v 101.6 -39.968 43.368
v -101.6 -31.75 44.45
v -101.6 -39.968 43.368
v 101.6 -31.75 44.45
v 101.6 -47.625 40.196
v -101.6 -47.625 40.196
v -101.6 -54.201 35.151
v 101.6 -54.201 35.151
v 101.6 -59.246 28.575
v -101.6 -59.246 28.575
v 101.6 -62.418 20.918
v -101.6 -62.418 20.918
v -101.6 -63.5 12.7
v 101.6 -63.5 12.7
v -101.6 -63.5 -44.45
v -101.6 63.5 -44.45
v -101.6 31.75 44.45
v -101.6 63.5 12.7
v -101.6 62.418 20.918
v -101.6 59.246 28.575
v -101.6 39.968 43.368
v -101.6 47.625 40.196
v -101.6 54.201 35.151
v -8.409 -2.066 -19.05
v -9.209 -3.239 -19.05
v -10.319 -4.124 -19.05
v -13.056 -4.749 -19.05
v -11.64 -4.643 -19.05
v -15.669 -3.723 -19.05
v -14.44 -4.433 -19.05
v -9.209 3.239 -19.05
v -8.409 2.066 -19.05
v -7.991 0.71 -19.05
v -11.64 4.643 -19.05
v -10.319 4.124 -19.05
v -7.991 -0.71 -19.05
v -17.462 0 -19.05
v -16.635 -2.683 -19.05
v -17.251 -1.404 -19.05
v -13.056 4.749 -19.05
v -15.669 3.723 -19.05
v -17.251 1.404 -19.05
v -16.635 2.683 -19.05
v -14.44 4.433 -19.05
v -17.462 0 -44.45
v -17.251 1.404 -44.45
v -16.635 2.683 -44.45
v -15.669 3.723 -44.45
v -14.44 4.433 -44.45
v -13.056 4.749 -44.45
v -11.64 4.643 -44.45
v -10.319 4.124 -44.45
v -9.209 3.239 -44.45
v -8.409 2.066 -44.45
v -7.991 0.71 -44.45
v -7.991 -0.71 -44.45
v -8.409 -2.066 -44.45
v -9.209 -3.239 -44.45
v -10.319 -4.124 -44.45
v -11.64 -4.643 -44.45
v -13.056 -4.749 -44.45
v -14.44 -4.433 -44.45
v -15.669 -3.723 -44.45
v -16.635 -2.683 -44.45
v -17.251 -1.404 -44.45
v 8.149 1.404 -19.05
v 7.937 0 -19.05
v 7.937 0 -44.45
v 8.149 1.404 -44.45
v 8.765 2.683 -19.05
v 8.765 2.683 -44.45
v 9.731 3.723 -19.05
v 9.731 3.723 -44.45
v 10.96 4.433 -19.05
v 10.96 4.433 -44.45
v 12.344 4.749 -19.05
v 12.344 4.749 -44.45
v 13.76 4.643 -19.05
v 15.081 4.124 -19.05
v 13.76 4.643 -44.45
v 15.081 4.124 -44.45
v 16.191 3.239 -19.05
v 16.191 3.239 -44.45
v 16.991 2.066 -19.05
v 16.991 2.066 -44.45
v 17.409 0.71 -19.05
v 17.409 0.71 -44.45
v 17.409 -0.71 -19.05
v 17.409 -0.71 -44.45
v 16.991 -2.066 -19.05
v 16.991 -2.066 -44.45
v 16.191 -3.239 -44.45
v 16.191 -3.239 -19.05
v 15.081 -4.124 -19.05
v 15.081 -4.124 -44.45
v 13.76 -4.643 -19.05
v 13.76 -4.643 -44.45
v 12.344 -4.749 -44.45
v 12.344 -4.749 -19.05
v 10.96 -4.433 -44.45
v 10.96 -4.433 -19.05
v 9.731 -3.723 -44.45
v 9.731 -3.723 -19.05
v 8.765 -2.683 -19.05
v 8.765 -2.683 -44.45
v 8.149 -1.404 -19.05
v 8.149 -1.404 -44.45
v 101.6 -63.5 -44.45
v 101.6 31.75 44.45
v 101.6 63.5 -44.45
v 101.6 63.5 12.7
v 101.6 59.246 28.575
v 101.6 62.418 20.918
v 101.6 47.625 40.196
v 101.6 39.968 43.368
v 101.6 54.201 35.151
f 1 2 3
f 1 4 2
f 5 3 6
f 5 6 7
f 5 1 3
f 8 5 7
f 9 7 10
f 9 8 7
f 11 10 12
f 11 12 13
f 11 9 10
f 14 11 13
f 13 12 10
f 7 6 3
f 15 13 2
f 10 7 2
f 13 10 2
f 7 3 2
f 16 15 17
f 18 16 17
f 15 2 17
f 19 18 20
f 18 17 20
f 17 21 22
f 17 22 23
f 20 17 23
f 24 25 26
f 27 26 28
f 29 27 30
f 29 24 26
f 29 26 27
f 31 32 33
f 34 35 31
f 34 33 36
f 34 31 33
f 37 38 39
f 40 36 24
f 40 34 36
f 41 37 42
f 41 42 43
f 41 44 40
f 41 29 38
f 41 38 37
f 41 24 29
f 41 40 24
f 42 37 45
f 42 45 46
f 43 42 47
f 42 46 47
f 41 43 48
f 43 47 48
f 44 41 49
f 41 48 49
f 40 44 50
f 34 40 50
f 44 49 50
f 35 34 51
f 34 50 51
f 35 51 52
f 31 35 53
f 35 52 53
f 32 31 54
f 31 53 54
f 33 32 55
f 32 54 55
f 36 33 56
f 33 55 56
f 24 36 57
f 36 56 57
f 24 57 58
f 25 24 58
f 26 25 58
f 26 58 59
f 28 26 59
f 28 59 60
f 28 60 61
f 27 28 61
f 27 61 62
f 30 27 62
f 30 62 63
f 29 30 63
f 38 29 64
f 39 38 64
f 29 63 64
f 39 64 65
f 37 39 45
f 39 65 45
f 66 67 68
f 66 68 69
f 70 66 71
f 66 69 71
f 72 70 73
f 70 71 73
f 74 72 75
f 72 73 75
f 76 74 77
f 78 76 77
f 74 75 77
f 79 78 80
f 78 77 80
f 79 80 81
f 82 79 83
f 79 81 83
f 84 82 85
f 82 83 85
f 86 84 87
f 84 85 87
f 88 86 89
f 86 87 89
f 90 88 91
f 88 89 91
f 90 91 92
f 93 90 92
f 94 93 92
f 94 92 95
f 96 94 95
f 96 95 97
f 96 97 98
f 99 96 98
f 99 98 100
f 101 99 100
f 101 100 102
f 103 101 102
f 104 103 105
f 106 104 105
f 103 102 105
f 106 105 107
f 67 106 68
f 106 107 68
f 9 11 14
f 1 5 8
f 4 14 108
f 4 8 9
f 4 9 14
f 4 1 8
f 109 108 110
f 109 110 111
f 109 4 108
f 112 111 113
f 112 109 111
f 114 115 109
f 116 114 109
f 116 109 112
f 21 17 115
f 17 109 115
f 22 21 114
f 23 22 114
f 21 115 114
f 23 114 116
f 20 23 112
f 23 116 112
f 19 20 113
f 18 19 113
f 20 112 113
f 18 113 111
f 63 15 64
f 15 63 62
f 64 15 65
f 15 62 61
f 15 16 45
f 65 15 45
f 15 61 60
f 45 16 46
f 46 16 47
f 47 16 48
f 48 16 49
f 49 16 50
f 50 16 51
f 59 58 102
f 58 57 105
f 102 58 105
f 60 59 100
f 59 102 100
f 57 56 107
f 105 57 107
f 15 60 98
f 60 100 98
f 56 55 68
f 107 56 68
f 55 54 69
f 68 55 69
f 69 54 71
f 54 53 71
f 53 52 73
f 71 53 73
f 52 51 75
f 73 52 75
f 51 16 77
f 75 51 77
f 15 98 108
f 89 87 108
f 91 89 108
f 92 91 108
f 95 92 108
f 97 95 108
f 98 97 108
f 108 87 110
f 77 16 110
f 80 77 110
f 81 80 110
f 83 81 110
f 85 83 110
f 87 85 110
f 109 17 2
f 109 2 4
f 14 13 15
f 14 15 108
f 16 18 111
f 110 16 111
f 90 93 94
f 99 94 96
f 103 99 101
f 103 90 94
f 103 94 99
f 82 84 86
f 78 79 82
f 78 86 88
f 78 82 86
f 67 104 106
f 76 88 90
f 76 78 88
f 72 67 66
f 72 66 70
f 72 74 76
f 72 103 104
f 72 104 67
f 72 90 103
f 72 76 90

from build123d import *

# Parameters (mm, degrees)
SKETCH1_W           = 203.2
SKETCH1_H           = 127
BOSS_EXTRUDE1_DEPTH = 44.45
FILLET1_R           = 31.75
SKETCH3_R           = 4.7625
CUT_EXTRUDE1_DEPTH  = 25.4


with BuildPart() as part:
    # Sketch1 → Boss-Extrude1 (new, symmetric)
    with BuildSketch(Plane.XY):
        Rectangle(SKETCH1_W, SKETCH1_H)
    extrude(amount=BOSS_EXTRUDE1_DEPTH, both=True)

    # Fillet1
    fillet1_edges = [part.edges().sort_by_distance(p)[0] for p in [
        (0, -63.5, 44.45),
        (0, 63.5, 44.45),
    ]]
    fillet(fillet1_edges, radius=FILLET1_R)

    # Sketch3 → Cut-Extrude1 (cut)
    with BuildSketch(Plane(origin=(0, 0, -44.45), x_dir=(-1, 0, 0), z_dir=(0, 0, -1))):
        with Locations((-12.7, 0)):
            Circle(SKETCH3_R)
        with Locations((12.7, 0)):
            Circle(SKETCH3_R)
    extrude(amount=-CUT_EXTRUDE1_DEPTH, mode=Mode.SUBTRACT)


solid = part.part
